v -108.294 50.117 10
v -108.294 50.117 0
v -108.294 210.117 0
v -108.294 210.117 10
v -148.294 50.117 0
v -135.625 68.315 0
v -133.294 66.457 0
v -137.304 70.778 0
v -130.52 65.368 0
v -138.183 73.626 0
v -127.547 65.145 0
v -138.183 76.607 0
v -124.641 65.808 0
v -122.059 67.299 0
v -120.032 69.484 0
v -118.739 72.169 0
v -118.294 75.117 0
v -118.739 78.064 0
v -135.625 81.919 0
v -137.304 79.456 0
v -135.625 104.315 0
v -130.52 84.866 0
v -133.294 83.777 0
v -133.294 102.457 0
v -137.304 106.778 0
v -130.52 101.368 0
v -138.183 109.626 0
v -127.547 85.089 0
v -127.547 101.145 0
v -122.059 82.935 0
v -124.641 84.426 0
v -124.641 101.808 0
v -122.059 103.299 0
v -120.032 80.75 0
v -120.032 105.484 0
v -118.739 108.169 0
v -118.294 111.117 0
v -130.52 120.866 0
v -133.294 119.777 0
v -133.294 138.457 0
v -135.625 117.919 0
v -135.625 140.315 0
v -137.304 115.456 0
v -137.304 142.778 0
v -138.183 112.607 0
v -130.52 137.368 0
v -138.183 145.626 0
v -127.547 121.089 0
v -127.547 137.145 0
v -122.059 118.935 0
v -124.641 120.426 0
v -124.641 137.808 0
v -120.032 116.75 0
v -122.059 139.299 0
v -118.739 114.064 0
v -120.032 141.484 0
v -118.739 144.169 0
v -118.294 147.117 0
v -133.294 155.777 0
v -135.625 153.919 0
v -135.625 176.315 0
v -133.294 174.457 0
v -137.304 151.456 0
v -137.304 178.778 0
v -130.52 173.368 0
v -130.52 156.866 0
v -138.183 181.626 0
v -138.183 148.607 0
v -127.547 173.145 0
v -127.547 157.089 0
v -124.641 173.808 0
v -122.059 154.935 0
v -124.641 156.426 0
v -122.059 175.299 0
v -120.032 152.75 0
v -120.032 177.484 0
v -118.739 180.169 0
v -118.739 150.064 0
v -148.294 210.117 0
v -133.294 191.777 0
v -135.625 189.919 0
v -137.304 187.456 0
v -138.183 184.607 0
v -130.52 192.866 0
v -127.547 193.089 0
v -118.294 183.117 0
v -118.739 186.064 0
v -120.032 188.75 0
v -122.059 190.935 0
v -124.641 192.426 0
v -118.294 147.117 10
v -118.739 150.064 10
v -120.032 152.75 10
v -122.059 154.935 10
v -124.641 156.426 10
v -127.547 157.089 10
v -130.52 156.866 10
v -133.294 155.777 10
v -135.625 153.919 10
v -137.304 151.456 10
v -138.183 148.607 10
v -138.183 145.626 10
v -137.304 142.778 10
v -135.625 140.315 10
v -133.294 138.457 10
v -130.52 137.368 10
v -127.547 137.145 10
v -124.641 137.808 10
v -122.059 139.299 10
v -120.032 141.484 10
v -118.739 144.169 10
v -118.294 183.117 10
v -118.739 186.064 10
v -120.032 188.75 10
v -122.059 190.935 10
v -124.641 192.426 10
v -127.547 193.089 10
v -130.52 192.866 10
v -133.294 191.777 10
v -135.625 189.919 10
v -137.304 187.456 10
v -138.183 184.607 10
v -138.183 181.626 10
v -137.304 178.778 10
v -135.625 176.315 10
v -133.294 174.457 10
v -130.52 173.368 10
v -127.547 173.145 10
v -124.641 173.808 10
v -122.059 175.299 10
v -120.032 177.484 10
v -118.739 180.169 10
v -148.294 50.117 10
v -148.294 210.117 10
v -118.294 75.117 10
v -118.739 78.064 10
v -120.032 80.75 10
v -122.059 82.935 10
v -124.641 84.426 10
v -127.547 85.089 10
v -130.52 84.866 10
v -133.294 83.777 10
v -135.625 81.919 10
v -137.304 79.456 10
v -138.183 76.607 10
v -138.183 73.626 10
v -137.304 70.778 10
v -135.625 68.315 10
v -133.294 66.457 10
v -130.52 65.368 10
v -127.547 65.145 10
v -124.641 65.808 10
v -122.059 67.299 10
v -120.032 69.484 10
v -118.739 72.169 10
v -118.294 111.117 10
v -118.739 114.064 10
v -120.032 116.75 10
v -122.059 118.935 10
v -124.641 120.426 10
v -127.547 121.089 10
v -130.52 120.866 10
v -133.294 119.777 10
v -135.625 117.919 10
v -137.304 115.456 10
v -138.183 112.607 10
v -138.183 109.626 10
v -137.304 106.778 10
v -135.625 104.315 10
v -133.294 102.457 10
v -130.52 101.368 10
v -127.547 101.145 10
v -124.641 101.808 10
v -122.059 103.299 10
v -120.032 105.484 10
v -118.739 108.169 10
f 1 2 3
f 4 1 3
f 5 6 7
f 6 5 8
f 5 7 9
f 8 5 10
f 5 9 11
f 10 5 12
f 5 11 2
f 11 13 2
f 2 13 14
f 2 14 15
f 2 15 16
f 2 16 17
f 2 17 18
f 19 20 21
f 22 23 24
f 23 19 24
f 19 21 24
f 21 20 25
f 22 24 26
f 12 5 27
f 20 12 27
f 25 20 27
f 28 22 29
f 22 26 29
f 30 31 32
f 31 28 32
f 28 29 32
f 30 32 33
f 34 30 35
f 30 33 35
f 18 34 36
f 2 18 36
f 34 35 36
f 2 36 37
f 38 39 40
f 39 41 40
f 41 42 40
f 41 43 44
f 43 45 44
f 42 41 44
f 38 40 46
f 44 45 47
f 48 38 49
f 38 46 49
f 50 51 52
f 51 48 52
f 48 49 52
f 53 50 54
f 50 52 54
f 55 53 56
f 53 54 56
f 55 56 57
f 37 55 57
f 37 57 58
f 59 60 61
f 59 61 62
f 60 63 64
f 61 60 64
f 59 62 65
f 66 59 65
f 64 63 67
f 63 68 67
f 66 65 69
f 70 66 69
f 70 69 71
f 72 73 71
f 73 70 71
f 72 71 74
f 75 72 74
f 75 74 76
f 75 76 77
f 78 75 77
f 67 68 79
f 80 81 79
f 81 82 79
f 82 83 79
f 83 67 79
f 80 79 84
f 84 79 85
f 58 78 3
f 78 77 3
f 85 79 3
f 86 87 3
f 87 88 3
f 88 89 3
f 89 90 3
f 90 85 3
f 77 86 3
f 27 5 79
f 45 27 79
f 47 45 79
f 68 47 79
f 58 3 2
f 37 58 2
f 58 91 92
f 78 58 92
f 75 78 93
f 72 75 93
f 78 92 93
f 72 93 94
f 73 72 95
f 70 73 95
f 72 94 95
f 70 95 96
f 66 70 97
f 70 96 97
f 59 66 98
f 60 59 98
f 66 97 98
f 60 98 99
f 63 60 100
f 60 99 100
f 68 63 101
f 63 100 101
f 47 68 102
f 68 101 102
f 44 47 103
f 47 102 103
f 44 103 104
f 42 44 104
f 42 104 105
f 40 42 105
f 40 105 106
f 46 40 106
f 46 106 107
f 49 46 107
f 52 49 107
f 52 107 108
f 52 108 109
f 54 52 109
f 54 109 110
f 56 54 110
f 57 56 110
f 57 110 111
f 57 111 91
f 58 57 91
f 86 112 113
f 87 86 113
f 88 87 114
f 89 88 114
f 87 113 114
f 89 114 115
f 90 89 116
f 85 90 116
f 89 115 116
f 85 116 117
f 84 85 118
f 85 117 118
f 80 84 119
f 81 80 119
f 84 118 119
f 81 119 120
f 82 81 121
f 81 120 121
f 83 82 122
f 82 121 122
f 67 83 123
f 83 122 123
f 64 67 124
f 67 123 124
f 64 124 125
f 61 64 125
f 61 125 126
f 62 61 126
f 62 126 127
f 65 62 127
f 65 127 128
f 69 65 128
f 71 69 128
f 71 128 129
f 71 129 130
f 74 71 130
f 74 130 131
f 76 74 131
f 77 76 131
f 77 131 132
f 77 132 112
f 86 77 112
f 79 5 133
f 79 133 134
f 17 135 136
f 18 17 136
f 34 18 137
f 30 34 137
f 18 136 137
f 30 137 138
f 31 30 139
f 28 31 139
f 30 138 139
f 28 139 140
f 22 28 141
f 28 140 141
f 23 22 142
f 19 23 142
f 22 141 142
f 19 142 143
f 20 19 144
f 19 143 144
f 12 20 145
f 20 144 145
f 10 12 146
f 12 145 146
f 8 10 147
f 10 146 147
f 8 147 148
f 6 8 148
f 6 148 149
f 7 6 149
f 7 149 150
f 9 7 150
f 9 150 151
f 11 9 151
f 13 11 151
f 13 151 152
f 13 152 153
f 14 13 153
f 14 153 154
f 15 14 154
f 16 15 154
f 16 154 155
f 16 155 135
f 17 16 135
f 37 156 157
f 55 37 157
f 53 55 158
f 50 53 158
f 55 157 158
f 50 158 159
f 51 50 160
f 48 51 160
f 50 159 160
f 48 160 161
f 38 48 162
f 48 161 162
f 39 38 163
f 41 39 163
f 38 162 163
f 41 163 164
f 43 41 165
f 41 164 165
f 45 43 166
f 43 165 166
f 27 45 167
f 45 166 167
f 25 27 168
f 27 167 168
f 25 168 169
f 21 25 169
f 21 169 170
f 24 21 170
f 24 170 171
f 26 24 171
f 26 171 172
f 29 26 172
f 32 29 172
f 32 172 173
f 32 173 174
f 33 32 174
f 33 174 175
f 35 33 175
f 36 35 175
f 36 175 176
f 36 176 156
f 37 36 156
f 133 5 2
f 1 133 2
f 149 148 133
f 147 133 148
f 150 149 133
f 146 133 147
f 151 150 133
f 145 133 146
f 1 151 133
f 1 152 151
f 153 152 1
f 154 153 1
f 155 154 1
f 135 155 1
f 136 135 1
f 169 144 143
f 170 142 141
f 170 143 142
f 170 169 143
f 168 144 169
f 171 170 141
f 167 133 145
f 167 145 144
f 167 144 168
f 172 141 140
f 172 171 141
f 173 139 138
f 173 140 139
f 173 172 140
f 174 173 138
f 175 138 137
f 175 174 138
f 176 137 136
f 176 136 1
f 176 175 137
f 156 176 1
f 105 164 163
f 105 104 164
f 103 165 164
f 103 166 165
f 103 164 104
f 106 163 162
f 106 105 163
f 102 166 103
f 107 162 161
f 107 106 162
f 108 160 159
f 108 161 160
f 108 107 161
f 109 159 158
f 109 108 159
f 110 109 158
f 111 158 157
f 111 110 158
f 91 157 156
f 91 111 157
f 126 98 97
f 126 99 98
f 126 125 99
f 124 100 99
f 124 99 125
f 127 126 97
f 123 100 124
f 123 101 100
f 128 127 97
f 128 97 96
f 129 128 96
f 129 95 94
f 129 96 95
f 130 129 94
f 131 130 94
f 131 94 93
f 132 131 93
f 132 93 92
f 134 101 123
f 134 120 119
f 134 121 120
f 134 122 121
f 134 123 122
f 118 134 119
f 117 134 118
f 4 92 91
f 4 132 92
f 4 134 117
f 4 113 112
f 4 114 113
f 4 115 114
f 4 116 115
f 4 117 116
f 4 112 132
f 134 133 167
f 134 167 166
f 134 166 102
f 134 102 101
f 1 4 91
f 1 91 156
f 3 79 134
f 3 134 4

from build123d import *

# Parameters (mm, degrees)
SKETCH1_W           = 40
SKETCH1_H           = 160
BOSS_EXTRUDE1_DEPTH = 10
SKETCH2_R           = 10
CUT_EXTRUDE1_DEPTH  = 11
LPATTERN1_COUNT     = 4
LPATTERN1_PITCH     = 36


with BuildPart() as part:
    # Sketch1 → Boss-Extrude1 (new body)
    with BuildSketch(Plane.XY):
        with Locations((-128.294392523, 130.11682243)):
            Rectangle(SKETCH1_W, SKETCH1_H)
    extrude(amount=BOSS_EXTRUDE1_DEPTH)

    # Sketch2 → Cut-Extrude1 (cut, through all)
    with BuildSketch(Plane.XY.offset(10)):
        with Locations((-128.294392523, 75.11682243)):
            Circle(SKETCH2_R)
    cut_extrude1 = extrude(amount=-CUT_EXTRUDE1_DEPTH, mode=Mode.SUBTRACT)

    # LPattern1: Cut-Extrude1 ×4
    with Locations(*[(0, i * LPATTERN1_PITCH, 0) for i in range(1, LPATTERN1_COUNT)]):
        add(cut_extrude1, mode=Mode.SUBTRACT)


solid = part.part
